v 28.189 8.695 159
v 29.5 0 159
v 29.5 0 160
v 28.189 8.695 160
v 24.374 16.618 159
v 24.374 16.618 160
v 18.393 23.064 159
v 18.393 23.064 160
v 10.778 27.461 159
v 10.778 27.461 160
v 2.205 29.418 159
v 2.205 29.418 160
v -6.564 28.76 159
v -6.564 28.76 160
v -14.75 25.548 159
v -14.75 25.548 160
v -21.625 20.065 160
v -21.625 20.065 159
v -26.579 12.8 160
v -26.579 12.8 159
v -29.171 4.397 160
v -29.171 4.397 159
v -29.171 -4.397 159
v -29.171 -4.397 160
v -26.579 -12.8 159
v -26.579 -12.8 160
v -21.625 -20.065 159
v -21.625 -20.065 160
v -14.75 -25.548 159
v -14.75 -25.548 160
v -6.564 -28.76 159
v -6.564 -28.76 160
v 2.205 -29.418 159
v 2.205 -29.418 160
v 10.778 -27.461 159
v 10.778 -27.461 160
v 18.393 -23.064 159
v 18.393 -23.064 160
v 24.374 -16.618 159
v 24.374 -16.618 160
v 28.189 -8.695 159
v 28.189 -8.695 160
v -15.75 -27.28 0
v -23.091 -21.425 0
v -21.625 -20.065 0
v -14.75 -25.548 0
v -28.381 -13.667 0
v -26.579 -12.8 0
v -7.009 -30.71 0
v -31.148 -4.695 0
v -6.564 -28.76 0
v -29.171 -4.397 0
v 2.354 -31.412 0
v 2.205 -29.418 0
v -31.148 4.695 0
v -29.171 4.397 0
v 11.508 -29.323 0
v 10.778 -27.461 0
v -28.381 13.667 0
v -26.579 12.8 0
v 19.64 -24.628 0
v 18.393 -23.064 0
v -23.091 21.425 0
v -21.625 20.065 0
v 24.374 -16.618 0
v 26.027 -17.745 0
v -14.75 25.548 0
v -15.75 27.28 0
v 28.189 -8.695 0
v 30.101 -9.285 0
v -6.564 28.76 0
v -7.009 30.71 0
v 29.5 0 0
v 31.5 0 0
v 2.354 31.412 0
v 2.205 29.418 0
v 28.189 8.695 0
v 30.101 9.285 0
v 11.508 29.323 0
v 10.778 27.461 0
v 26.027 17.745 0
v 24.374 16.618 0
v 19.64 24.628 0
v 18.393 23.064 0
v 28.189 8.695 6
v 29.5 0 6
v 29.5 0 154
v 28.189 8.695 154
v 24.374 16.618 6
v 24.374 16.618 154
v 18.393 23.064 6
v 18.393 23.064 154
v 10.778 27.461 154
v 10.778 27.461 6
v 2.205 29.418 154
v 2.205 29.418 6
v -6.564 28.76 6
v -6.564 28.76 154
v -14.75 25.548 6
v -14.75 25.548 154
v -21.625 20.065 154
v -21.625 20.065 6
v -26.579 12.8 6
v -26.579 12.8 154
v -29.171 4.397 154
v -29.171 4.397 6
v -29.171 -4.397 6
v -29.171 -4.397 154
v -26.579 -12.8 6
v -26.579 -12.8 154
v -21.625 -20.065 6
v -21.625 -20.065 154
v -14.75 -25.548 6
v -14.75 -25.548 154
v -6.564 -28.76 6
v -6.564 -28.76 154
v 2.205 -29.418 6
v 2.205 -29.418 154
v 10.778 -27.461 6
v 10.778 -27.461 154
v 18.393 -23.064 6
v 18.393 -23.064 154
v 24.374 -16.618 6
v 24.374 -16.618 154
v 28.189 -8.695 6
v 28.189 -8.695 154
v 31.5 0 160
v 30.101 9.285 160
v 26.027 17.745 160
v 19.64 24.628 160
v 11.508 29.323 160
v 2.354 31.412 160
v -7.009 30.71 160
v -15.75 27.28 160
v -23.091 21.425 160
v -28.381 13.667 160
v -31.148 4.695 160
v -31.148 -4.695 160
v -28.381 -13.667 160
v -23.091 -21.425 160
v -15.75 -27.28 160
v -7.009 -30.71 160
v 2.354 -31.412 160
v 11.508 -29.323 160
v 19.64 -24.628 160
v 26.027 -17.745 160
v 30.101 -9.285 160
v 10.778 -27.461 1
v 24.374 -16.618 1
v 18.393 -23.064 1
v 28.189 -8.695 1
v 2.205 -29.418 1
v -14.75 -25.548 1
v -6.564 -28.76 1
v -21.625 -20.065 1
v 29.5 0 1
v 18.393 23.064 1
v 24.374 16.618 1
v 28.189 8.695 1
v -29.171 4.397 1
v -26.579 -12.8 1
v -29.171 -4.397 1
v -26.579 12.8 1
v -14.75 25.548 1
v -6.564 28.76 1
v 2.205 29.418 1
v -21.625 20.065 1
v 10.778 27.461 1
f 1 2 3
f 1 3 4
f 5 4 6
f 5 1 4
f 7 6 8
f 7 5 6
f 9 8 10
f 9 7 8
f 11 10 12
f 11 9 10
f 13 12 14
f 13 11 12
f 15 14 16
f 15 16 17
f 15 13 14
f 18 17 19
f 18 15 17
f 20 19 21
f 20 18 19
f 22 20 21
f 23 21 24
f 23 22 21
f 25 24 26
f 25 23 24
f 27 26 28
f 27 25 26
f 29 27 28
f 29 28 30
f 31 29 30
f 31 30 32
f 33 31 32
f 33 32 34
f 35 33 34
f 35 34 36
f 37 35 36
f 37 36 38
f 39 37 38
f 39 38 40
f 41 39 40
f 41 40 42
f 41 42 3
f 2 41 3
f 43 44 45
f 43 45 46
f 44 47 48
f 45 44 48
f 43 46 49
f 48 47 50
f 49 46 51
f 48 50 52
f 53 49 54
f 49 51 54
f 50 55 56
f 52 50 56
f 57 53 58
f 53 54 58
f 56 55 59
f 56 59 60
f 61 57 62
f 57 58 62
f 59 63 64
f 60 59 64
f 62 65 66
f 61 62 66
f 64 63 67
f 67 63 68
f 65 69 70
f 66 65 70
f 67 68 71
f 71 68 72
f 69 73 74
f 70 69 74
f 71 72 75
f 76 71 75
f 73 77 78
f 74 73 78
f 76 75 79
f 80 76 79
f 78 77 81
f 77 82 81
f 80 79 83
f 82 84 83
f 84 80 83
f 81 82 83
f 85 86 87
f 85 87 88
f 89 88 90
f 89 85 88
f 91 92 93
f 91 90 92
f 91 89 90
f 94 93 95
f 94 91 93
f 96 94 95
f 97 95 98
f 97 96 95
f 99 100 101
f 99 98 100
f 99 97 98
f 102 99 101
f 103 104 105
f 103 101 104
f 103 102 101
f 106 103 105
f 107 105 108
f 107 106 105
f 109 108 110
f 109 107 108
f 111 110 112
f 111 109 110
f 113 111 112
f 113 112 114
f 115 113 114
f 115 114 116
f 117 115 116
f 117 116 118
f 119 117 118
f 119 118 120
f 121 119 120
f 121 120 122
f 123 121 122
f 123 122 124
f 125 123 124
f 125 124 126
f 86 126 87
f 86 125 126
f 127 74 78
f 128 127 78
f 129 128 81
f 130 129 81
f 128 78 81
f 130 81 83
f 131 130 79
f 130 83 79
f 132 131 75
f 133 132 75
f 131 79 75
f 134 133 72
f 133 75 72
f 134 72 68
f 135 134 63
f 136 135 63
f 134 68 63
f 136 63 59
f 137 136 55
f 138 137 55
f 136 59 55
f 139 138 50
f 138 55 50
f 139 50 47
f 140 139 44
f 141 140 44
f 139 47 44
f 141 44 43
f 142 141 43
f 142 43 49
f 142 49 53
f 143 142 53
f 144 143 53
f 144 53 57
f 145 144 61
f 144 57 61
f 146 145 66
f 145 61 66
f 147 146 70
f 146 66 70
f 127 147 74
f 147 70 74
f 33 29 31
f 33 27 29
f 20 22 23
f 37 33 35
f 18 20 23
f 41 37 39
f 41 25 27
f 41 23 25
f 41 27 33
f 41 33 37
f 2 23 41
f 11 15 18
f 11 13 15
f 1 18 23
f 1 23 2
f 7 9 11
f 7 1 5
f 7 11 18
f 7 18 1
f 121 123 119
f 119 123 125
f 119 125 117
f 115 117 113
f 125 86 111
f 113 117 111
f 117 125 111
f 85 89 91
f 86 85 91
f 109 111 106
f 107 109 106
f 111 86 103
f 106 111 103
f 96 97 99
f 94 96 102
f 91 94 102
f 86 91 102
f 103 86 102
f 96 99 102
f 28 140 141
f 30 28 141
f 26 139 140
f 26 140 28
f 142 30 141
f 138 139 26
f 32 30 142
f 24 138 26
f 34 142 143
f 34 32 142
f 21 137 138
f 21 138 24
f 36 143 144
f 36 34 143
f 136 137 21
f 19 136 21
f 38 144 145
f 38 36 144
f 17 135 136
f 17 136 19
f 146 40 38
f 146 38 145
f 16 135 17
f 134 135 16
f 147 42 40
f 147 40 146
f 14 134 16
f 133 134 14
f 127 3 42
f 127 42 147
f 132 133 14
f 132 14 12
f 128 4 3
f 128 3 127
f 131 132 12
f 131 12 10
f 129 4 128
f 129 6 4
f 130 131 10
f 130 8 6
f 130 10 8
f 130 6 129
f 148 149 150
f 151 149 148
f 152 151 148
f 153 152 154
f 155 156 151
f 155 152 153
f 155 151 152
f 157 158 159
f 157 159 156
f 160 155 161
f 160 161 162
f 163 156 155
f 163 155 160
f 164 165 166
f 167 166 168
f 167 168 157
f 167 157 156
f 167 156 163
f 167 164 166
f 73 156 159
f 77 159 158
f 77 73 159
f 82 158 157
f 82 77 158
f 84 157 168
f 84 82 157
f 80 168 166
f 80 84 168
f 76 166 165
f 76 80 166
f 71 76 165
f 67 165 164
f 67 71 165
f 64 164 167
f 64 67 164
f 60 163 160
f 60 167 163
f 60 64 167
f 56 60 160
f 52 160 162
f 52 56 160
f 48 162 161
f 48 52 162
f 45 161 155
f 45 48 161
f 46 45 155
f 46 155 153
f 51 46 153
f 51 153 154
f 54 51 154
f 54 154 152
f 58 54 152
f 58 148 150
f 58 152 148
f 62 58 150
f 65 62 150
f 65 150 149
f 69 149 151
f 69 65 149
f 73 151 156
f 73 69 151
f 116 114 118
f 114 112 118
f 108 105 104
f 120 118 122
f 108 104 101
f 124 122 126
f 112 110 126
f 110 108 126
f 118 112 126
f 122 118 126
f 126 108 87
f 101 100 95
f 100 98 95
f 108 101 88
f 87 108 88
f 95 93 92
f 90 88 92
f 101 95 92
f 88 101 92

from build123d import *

# Parameters (mm, degrees)
ESQUISSE1_R        = 31.5
ESQUISSE1_R_2      = 29.5
BOSS_EXTRU_1_DEPTH = 160
ESQUISSE2_R        = 30
BOSS_EXTRU_2_DEPTH = 5
ESQUISSE3_R        = 30
BOSS_EXTRU_3_DEPTH = 5


with BuildPart() as part:
    # Esquisse1 → Boss.-Extru.1 (new body)
    with BuildSketch(Plane.XY):
        Circle(ESQUISSE1_R)
        Circle(ESQUISSE1_R_2, mode=Mode.SUBTRACT)
    extrude(amount=BOSS_EXTRU_1_DEPTH)

    # Esquisse2 → Boss.-Extru.2 (add)
    with BuildSketch(Plane(origin=(0, 0, 1), x_dir=(-1, 0, 0), z_dir=(0, 0, -1))):
        Circle(ESQUISSE2_R)
    extrude(amount=-BOSS_EXTRU_2_DEPTH)

    # Esquisse3 → Boss.-Extru.3 (add)
    with BuildSketch(Plane.XY.offset(159)):
        Circle(ESQUISSE3_R)
    extrude(amount=-BOSS_EXTRU_3_DEPTH)


solid = part.part
